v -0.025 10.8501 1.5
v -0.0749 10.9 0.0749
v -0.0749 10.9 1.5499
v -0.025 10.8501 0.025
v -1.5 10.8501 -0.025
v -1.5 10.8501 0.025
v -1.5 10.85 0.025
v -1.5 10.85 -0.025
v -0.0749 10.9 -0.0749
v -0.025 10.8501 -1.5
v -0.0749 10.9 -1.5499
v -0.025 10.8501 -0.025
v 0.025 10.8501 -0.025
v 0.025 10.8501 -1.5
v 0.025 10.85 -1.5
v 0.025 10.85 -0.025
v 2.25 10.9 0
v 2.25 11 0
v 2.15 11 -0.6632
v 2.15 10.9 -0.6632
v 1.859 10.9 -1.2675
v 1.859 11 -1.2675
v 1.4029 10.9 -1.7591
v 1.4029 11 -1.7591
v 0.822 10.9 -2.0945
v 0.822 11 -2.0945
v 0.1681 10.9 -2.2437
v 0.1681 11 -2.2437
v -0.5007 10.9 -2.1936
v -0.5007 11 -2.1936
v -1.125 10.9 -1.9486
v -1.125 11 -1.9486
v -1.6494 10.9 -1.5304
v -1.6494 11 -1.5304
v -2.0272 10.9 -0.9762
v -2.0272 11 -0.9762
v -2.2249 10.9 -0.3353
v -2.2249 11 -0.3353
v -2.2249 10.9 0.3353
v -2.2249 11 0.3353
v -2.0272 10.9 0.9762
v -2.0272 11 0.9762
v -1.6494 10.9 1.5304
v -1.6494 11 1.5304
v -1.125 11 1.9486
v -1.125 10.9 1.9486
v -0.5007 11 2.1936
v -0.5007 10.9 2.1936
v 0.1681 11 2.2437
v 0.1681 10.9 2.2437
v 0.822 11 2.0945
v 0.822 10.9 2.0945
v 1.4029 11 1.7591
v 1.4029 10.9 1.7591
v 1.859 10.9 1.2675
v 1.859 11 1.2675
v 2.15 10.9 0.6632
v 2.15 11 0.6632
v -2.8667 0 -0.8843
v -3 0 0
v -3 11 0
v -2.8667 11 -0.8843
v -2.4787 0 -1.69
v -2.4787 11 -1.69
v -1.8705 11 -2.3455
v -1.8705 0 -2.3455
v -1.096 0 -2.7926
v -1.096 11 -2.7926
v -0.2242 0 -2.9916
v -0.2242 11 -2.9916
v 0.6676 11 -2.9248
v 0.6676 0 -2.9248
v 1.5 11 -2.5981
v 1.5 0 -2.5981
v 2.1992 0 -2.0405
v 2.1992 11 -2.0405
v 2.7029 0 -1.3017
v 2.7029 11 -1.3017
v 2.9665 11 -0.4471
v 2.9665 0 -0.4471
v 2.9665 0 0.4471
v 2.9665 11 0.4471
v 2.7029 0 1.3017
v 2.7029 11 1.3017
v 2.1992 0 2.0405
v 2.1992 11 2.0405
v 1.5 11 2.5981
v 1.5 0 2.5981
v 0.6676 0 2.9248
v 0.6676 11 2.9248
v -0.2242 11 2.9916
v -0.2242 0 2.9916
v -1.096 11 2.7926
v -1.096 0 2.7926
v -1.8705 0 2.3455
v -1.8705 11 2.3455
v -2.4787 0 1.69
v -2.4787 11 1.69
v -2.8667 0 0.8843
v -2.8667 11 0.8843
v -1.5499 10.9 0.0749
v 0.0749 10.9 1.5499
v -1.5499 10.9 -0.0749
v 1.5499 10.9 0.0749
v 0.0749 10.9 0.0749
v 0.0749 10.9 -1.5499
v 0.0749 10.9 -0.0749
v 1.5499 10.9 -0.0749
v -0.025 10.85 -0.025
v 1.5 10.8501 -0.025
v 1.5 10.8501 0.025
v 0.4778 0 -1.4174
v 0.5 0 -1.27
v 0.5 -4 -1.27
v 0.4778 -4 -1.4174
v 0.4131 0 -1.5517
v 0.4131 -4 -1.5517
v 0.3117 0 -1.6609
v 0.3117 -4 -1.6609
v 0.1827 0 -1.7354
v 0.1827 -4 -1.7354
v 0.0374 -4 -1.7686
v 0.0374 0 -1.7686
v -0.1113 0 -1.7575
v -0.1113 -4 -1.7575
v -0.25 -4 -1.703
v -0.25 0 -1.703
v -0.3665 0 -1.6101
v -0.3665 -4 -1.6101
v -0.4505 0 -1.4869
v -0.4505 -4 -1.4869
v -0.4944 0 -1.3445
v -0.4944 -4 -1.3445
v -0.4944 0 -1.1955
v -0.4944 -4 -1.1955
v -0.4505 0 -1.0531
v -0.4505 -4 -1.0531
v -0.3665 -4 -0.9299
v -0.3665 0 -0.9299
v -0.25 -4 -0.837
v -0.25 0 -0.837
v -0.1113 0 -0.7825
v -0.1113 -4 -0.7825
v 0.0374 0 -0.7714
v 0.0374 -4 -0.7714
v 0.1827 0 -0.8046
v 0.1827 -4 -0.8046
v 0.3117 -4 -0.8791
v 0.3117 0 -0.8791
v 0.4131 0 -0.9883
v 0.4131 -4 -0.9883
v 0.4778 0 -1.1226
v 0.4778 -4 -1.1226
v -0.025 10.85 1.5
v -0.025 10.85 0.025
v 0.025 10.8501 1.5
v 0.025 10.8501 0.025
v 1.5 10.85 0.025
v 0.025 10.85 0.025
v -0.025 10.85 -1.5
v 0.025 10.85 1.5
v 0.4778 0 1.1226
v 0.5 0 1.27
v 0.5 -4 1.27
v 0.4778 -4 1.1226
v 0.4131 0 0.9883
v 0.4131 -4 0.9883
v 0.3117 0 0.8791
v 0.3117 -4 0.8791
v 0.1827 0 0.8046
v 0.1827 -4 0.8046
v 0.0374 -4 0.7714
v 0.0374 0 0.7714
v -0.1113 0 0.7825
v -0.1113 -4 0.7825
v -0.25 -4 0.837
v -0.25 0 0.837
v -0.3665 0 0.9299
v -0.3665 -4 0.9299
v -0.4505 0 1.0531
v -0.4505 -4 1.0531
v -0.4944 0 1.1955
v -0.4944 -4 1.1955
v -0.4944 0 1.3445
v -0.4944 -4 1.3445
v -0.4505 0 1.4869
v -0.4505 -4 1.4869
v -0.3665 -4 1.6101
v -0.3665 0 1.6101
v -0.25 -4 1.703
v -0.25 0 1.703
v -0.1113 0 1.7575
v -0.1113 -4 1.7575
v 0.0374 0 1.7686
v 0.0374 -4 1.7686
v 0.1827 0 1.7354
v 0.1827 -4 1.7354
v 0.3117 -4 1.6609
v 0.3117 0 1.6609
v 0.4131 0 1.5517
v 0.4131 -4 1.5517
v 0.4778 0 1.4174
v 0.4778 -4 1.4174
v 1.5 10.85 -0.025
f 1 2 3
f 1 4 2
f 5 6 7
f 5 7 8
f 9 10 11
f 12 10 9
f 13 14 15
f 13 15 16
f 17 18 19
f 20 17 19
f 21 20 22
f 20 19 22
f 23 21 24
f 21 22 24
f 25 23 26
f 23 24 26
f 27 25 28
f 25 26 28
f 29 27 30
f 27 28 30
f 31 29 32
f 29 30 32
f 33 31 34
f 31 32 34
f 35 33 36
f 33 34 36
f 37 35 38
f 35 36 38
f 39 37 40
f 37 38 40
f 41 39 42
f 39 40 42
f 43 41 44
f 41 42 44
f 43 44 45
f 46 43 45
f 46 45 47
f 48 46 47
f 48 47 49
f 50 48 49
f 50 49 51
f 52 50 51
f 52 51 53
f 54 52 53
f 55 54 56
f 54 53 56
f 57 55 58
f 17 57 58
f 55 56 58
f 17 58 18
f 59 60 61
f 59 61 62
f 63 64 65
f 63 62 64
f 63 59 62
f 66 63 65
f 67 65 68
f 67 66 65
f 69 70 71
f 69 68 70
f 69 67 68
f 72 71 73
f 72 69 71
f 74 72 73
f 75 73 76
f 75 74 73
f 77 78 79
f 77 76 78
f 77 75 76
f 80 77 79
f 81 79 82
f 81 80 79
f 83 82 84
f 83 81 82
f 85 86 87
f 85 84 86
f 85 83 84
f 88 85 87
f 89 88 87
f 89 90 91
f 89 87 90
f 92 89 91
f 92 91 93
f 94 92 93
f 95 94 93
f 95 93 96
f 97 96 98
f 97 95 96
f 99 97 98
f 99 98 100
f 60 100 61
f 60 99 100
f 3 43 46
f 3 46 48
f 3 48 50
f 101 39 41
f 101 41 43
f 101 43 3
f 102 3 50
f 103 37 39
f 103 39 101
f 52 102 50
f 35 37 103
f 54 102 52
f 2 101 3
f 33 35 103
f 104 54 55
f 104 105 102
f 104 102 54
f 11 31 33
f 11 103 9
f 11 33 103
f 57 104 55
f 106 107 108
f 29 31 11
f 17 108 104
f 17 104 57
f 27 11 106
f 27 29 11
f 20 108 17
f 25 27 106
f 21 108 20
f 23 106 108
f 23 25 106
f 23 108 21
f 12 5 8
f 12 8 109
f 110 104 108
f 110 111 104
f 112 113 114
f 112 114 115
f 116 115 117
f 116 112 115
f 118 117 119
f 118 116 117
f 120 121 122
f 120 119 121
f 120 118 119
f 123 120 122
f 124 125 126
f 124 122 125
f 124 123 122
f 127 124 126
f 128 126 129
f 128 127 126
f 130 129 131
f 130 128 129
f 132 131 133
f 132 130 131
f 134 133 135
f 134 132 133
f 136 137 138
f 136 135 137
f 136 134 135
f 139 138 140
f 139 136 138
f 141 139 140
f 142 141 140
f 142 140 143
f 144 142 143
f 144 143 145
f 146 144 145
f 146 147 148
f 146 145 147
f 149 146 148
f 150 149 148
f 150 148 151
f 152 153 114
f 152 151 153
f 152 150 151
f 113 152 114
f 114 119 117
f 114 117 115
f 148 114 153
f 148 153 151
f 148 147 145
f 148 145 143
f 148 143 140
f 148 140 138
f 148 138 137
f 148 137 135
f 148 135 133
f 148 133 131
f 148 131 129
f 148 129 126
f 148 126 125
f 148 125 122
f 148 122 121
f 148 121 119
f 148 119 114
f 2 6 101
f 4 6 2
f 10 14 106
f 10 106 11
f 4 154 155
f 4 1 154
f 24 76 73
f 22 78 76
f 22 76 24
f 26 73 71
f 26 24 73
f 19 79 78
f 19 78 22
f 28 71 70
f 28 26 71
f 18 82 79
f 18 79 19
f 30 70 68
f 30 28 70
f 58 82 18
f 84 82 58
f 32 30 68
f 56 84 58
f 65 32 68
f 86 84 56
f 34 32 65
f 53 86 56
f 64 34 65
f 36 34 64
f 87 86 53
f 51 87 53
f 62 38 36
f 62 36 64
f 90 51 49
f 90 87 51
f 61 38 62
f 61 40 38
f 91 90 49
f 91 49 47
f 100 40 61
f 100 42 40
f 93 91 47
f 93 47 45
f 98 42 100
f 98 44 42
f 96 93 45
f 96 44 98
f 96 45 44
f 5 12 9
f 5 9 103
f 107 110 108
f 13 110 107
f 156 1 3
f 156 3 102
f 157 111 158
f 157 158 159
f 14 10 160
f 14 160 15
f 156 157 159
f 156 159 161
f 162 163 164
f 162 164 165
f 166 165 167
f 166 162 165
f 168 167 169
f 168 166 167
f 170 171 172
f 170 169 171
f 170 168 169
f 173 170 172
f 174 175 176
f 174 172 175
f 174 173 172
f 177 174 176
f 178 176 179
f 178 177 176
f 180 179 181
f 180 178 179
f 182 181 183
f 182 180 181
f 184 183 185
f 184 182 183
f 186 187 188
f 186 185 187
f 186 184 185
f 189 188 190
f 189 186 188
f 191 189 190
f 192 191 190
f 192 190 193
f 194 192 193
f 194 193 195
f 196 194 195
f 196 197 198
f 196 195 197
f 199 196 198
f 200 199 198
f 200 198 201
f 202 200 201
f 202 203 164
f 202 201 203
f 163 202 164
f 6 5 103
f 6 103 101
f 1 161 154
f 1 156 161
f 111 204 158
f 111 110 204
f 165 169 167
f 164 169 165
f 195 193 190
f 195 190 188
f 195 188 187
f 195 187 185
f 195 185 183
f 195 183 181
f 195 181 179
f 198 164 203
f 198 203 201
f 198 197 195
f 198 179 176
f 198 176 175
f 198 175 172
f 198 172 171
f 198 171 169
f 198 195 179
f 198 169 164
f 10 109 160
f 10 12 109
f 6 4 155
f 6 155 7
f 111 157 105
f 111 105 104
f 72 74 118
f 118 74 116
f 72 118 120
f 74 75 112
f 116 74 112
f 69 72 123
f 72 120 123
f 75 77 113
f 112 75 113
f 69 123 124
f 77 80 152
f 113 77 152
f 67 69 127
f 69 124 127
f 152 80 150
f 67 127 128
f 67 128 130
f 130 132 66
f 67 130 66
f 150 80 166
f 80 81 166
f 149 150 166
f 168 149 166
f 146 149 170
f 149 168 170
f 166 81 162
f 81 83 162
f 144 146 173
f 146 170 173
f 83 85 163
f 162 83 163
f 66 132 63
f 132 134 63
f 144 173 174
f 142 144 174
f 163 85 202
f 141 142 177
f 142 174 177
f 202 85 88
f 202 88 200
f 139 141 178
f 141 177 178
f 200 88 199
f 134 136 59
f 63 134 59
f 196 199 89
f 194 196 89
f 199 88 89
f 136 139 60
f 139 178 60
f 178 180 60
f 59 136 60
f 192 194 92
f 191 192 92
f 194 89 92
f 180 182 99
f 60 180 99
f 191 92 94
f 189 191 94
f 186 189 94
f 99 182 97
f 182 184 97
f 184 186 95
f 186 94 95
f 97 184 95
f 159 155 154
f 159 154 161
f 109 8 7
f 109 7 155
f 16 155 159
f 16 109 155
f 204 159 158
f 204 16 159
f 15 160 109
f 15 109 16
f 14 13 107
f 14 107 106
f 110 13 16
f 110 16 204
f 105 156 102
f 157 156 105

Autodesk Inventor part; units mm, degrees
sketch "Skizze3" plane through (0, 0, 0) normal (0, 1, 0) x (-1, 0, 0)
  circle A0 centre (0, 0) radius 3
  dimension "Durchmesser" = 6
extrude "Extrusion2" add sketch "Skizze3" along normal blind 11
sketch "Skizze4" plane through (0, 0, 0) normal (0, -1, 0) x (1, 0, 0)
  circle A0 centre (0, 1.27) radius 0.5
  circle A1 centre (0, -1.27) radius 0.5
  point P0 (0, 0)
  dimension "d6" = 1
  dimension "d7" = 1
  dimension "BeinAbstand" = 2.54
  dimension "BeinZuMitte" = 1.27
extrude "Extrusion3" add sketch "Skizze4" along normal blind 4
ref_plane "Arbeitsebene1" through (-1.5, 0, 0) normal (1, 0, 0) x (0, 1, 0)
ref_plane "Arbeitsebene2" through (1.5, 0, 0) normal (1, 0, 0) x (0, 1, 0)
split_face "Trennen1"
split_face "Trennen2"
ref_plane "Arbeitsebene3" through (-0.5, 0, 0) normal (1, 0, 0) x (0, 1, 0)
ref_plane "Arbeitsebene4" through (0.5, 0, 0) normal (1, 0, 0) x (0, 1, 0)
ref_plane "Arbeitsebene5" through (0, 9, 0) normal (0, 1, 0) x (1, 0, 0)
ref_plane "Arbeitsebene6" through (0, 6.5, 0) normal (0, 1, 0) x (1, 0, 0)
sketch "Skizze5" plane through (0, 11, 0) normal (0, 1, 0) x (1, 0, 0)
  circle A0 centre (0, 0) radius 2.25
  dimension "d21" = 4.5
extrude "Extrusion4" cut sketch "Skizze5" against normal blind 0.1
split_face "Trennen3"
split_face "Trennen4"
split_face "Trennen7"
split_face "Trennen8"
ref_plane "Arbeitsebene9" through (0, 3.5, 0) normal (0, -1, 0) x (1, 0, 0)
ref_plane "Arbeitsebene10" through (0, 1, 0) normal (0, -1, 0) x (1, 0, 0)
split_face "Trennen9"
split_face "Trennen10"
sketch "Skizze6" plane through (0, 10.9, 0) normal (0, 1, 0) x (1, 0, 0)
  line L0 (1.5, -0.025) -> (0, -0.025)
  line L1 (0, -0.025) -> (0, 0.025)
  line L2 (0, 0.025) -> (1.5, 0.025)
  line L3 (1.5, 0.025) -> (1.5, -0.025)
  line L4 (0.025, 1.5) -> (0.025, 0)
  line L5 (-0.025, 0) -> (-0.025, 1.5)
  line L6 (0.025, 0) -> (-0.025, 0)
  line L7 (-0.025, 1.5) -> (0.025, 1.5)
  line L8 (-1.5, 0.025) -> (0, 0.025)
  line L9 (0, -0.025) -> (-1.5, -0.025)
  line L10 (0, 0.025) -> (0, -0.025)
  line L11 (-1.5, -0.025) -> (-1.5, 0.025)
  line L12 (-0.025, -1.5) -> (-0.025, 0)
  line L13 (0.025, 0) -> (0.025, -1.5)
  line L14 (-0.025, 0) -> (0.025, 0)
  line L15 (0.025, -1.5) -> (-0.025, -1.5)
  point P0 (0, 0)
  point P1 (0, 0)
  point P2 (0, 0)
  point P3 (0, 0)
  dimension "d26" = 0.05
  dimension "d27" = 0.025
  dimension "d28" = 1.5
  dimension "d31" = 360
extrude "Extrusion5" cut sketch "Skizze6" against normal blind 0.05
chamfer "Fase1" distance 0.05 angle 45 12 edges at (-0.025, 10.9, 0.7625) (0, 10.9, 1.5) (0.025, 10.9, 0.7625) (-0.7625, 10.9, 0.025) (-0.7625, 10.9, -0.025) (-0.025, 10.9, -0.7625) (0.025, 10.9, -0.7625) (0.7625, 10.9, 0.025) (0.7625, 10.9, -0.025) (0, 10.9, -1.5) (-1.5, 10.9, 0) (1.5, 10.9, 0)
fillet_without_effect "Rundung1"
equation "\"BeinZuMitte\" = 0.5 * BeinAbstand"
properties part number "Kondensator"
